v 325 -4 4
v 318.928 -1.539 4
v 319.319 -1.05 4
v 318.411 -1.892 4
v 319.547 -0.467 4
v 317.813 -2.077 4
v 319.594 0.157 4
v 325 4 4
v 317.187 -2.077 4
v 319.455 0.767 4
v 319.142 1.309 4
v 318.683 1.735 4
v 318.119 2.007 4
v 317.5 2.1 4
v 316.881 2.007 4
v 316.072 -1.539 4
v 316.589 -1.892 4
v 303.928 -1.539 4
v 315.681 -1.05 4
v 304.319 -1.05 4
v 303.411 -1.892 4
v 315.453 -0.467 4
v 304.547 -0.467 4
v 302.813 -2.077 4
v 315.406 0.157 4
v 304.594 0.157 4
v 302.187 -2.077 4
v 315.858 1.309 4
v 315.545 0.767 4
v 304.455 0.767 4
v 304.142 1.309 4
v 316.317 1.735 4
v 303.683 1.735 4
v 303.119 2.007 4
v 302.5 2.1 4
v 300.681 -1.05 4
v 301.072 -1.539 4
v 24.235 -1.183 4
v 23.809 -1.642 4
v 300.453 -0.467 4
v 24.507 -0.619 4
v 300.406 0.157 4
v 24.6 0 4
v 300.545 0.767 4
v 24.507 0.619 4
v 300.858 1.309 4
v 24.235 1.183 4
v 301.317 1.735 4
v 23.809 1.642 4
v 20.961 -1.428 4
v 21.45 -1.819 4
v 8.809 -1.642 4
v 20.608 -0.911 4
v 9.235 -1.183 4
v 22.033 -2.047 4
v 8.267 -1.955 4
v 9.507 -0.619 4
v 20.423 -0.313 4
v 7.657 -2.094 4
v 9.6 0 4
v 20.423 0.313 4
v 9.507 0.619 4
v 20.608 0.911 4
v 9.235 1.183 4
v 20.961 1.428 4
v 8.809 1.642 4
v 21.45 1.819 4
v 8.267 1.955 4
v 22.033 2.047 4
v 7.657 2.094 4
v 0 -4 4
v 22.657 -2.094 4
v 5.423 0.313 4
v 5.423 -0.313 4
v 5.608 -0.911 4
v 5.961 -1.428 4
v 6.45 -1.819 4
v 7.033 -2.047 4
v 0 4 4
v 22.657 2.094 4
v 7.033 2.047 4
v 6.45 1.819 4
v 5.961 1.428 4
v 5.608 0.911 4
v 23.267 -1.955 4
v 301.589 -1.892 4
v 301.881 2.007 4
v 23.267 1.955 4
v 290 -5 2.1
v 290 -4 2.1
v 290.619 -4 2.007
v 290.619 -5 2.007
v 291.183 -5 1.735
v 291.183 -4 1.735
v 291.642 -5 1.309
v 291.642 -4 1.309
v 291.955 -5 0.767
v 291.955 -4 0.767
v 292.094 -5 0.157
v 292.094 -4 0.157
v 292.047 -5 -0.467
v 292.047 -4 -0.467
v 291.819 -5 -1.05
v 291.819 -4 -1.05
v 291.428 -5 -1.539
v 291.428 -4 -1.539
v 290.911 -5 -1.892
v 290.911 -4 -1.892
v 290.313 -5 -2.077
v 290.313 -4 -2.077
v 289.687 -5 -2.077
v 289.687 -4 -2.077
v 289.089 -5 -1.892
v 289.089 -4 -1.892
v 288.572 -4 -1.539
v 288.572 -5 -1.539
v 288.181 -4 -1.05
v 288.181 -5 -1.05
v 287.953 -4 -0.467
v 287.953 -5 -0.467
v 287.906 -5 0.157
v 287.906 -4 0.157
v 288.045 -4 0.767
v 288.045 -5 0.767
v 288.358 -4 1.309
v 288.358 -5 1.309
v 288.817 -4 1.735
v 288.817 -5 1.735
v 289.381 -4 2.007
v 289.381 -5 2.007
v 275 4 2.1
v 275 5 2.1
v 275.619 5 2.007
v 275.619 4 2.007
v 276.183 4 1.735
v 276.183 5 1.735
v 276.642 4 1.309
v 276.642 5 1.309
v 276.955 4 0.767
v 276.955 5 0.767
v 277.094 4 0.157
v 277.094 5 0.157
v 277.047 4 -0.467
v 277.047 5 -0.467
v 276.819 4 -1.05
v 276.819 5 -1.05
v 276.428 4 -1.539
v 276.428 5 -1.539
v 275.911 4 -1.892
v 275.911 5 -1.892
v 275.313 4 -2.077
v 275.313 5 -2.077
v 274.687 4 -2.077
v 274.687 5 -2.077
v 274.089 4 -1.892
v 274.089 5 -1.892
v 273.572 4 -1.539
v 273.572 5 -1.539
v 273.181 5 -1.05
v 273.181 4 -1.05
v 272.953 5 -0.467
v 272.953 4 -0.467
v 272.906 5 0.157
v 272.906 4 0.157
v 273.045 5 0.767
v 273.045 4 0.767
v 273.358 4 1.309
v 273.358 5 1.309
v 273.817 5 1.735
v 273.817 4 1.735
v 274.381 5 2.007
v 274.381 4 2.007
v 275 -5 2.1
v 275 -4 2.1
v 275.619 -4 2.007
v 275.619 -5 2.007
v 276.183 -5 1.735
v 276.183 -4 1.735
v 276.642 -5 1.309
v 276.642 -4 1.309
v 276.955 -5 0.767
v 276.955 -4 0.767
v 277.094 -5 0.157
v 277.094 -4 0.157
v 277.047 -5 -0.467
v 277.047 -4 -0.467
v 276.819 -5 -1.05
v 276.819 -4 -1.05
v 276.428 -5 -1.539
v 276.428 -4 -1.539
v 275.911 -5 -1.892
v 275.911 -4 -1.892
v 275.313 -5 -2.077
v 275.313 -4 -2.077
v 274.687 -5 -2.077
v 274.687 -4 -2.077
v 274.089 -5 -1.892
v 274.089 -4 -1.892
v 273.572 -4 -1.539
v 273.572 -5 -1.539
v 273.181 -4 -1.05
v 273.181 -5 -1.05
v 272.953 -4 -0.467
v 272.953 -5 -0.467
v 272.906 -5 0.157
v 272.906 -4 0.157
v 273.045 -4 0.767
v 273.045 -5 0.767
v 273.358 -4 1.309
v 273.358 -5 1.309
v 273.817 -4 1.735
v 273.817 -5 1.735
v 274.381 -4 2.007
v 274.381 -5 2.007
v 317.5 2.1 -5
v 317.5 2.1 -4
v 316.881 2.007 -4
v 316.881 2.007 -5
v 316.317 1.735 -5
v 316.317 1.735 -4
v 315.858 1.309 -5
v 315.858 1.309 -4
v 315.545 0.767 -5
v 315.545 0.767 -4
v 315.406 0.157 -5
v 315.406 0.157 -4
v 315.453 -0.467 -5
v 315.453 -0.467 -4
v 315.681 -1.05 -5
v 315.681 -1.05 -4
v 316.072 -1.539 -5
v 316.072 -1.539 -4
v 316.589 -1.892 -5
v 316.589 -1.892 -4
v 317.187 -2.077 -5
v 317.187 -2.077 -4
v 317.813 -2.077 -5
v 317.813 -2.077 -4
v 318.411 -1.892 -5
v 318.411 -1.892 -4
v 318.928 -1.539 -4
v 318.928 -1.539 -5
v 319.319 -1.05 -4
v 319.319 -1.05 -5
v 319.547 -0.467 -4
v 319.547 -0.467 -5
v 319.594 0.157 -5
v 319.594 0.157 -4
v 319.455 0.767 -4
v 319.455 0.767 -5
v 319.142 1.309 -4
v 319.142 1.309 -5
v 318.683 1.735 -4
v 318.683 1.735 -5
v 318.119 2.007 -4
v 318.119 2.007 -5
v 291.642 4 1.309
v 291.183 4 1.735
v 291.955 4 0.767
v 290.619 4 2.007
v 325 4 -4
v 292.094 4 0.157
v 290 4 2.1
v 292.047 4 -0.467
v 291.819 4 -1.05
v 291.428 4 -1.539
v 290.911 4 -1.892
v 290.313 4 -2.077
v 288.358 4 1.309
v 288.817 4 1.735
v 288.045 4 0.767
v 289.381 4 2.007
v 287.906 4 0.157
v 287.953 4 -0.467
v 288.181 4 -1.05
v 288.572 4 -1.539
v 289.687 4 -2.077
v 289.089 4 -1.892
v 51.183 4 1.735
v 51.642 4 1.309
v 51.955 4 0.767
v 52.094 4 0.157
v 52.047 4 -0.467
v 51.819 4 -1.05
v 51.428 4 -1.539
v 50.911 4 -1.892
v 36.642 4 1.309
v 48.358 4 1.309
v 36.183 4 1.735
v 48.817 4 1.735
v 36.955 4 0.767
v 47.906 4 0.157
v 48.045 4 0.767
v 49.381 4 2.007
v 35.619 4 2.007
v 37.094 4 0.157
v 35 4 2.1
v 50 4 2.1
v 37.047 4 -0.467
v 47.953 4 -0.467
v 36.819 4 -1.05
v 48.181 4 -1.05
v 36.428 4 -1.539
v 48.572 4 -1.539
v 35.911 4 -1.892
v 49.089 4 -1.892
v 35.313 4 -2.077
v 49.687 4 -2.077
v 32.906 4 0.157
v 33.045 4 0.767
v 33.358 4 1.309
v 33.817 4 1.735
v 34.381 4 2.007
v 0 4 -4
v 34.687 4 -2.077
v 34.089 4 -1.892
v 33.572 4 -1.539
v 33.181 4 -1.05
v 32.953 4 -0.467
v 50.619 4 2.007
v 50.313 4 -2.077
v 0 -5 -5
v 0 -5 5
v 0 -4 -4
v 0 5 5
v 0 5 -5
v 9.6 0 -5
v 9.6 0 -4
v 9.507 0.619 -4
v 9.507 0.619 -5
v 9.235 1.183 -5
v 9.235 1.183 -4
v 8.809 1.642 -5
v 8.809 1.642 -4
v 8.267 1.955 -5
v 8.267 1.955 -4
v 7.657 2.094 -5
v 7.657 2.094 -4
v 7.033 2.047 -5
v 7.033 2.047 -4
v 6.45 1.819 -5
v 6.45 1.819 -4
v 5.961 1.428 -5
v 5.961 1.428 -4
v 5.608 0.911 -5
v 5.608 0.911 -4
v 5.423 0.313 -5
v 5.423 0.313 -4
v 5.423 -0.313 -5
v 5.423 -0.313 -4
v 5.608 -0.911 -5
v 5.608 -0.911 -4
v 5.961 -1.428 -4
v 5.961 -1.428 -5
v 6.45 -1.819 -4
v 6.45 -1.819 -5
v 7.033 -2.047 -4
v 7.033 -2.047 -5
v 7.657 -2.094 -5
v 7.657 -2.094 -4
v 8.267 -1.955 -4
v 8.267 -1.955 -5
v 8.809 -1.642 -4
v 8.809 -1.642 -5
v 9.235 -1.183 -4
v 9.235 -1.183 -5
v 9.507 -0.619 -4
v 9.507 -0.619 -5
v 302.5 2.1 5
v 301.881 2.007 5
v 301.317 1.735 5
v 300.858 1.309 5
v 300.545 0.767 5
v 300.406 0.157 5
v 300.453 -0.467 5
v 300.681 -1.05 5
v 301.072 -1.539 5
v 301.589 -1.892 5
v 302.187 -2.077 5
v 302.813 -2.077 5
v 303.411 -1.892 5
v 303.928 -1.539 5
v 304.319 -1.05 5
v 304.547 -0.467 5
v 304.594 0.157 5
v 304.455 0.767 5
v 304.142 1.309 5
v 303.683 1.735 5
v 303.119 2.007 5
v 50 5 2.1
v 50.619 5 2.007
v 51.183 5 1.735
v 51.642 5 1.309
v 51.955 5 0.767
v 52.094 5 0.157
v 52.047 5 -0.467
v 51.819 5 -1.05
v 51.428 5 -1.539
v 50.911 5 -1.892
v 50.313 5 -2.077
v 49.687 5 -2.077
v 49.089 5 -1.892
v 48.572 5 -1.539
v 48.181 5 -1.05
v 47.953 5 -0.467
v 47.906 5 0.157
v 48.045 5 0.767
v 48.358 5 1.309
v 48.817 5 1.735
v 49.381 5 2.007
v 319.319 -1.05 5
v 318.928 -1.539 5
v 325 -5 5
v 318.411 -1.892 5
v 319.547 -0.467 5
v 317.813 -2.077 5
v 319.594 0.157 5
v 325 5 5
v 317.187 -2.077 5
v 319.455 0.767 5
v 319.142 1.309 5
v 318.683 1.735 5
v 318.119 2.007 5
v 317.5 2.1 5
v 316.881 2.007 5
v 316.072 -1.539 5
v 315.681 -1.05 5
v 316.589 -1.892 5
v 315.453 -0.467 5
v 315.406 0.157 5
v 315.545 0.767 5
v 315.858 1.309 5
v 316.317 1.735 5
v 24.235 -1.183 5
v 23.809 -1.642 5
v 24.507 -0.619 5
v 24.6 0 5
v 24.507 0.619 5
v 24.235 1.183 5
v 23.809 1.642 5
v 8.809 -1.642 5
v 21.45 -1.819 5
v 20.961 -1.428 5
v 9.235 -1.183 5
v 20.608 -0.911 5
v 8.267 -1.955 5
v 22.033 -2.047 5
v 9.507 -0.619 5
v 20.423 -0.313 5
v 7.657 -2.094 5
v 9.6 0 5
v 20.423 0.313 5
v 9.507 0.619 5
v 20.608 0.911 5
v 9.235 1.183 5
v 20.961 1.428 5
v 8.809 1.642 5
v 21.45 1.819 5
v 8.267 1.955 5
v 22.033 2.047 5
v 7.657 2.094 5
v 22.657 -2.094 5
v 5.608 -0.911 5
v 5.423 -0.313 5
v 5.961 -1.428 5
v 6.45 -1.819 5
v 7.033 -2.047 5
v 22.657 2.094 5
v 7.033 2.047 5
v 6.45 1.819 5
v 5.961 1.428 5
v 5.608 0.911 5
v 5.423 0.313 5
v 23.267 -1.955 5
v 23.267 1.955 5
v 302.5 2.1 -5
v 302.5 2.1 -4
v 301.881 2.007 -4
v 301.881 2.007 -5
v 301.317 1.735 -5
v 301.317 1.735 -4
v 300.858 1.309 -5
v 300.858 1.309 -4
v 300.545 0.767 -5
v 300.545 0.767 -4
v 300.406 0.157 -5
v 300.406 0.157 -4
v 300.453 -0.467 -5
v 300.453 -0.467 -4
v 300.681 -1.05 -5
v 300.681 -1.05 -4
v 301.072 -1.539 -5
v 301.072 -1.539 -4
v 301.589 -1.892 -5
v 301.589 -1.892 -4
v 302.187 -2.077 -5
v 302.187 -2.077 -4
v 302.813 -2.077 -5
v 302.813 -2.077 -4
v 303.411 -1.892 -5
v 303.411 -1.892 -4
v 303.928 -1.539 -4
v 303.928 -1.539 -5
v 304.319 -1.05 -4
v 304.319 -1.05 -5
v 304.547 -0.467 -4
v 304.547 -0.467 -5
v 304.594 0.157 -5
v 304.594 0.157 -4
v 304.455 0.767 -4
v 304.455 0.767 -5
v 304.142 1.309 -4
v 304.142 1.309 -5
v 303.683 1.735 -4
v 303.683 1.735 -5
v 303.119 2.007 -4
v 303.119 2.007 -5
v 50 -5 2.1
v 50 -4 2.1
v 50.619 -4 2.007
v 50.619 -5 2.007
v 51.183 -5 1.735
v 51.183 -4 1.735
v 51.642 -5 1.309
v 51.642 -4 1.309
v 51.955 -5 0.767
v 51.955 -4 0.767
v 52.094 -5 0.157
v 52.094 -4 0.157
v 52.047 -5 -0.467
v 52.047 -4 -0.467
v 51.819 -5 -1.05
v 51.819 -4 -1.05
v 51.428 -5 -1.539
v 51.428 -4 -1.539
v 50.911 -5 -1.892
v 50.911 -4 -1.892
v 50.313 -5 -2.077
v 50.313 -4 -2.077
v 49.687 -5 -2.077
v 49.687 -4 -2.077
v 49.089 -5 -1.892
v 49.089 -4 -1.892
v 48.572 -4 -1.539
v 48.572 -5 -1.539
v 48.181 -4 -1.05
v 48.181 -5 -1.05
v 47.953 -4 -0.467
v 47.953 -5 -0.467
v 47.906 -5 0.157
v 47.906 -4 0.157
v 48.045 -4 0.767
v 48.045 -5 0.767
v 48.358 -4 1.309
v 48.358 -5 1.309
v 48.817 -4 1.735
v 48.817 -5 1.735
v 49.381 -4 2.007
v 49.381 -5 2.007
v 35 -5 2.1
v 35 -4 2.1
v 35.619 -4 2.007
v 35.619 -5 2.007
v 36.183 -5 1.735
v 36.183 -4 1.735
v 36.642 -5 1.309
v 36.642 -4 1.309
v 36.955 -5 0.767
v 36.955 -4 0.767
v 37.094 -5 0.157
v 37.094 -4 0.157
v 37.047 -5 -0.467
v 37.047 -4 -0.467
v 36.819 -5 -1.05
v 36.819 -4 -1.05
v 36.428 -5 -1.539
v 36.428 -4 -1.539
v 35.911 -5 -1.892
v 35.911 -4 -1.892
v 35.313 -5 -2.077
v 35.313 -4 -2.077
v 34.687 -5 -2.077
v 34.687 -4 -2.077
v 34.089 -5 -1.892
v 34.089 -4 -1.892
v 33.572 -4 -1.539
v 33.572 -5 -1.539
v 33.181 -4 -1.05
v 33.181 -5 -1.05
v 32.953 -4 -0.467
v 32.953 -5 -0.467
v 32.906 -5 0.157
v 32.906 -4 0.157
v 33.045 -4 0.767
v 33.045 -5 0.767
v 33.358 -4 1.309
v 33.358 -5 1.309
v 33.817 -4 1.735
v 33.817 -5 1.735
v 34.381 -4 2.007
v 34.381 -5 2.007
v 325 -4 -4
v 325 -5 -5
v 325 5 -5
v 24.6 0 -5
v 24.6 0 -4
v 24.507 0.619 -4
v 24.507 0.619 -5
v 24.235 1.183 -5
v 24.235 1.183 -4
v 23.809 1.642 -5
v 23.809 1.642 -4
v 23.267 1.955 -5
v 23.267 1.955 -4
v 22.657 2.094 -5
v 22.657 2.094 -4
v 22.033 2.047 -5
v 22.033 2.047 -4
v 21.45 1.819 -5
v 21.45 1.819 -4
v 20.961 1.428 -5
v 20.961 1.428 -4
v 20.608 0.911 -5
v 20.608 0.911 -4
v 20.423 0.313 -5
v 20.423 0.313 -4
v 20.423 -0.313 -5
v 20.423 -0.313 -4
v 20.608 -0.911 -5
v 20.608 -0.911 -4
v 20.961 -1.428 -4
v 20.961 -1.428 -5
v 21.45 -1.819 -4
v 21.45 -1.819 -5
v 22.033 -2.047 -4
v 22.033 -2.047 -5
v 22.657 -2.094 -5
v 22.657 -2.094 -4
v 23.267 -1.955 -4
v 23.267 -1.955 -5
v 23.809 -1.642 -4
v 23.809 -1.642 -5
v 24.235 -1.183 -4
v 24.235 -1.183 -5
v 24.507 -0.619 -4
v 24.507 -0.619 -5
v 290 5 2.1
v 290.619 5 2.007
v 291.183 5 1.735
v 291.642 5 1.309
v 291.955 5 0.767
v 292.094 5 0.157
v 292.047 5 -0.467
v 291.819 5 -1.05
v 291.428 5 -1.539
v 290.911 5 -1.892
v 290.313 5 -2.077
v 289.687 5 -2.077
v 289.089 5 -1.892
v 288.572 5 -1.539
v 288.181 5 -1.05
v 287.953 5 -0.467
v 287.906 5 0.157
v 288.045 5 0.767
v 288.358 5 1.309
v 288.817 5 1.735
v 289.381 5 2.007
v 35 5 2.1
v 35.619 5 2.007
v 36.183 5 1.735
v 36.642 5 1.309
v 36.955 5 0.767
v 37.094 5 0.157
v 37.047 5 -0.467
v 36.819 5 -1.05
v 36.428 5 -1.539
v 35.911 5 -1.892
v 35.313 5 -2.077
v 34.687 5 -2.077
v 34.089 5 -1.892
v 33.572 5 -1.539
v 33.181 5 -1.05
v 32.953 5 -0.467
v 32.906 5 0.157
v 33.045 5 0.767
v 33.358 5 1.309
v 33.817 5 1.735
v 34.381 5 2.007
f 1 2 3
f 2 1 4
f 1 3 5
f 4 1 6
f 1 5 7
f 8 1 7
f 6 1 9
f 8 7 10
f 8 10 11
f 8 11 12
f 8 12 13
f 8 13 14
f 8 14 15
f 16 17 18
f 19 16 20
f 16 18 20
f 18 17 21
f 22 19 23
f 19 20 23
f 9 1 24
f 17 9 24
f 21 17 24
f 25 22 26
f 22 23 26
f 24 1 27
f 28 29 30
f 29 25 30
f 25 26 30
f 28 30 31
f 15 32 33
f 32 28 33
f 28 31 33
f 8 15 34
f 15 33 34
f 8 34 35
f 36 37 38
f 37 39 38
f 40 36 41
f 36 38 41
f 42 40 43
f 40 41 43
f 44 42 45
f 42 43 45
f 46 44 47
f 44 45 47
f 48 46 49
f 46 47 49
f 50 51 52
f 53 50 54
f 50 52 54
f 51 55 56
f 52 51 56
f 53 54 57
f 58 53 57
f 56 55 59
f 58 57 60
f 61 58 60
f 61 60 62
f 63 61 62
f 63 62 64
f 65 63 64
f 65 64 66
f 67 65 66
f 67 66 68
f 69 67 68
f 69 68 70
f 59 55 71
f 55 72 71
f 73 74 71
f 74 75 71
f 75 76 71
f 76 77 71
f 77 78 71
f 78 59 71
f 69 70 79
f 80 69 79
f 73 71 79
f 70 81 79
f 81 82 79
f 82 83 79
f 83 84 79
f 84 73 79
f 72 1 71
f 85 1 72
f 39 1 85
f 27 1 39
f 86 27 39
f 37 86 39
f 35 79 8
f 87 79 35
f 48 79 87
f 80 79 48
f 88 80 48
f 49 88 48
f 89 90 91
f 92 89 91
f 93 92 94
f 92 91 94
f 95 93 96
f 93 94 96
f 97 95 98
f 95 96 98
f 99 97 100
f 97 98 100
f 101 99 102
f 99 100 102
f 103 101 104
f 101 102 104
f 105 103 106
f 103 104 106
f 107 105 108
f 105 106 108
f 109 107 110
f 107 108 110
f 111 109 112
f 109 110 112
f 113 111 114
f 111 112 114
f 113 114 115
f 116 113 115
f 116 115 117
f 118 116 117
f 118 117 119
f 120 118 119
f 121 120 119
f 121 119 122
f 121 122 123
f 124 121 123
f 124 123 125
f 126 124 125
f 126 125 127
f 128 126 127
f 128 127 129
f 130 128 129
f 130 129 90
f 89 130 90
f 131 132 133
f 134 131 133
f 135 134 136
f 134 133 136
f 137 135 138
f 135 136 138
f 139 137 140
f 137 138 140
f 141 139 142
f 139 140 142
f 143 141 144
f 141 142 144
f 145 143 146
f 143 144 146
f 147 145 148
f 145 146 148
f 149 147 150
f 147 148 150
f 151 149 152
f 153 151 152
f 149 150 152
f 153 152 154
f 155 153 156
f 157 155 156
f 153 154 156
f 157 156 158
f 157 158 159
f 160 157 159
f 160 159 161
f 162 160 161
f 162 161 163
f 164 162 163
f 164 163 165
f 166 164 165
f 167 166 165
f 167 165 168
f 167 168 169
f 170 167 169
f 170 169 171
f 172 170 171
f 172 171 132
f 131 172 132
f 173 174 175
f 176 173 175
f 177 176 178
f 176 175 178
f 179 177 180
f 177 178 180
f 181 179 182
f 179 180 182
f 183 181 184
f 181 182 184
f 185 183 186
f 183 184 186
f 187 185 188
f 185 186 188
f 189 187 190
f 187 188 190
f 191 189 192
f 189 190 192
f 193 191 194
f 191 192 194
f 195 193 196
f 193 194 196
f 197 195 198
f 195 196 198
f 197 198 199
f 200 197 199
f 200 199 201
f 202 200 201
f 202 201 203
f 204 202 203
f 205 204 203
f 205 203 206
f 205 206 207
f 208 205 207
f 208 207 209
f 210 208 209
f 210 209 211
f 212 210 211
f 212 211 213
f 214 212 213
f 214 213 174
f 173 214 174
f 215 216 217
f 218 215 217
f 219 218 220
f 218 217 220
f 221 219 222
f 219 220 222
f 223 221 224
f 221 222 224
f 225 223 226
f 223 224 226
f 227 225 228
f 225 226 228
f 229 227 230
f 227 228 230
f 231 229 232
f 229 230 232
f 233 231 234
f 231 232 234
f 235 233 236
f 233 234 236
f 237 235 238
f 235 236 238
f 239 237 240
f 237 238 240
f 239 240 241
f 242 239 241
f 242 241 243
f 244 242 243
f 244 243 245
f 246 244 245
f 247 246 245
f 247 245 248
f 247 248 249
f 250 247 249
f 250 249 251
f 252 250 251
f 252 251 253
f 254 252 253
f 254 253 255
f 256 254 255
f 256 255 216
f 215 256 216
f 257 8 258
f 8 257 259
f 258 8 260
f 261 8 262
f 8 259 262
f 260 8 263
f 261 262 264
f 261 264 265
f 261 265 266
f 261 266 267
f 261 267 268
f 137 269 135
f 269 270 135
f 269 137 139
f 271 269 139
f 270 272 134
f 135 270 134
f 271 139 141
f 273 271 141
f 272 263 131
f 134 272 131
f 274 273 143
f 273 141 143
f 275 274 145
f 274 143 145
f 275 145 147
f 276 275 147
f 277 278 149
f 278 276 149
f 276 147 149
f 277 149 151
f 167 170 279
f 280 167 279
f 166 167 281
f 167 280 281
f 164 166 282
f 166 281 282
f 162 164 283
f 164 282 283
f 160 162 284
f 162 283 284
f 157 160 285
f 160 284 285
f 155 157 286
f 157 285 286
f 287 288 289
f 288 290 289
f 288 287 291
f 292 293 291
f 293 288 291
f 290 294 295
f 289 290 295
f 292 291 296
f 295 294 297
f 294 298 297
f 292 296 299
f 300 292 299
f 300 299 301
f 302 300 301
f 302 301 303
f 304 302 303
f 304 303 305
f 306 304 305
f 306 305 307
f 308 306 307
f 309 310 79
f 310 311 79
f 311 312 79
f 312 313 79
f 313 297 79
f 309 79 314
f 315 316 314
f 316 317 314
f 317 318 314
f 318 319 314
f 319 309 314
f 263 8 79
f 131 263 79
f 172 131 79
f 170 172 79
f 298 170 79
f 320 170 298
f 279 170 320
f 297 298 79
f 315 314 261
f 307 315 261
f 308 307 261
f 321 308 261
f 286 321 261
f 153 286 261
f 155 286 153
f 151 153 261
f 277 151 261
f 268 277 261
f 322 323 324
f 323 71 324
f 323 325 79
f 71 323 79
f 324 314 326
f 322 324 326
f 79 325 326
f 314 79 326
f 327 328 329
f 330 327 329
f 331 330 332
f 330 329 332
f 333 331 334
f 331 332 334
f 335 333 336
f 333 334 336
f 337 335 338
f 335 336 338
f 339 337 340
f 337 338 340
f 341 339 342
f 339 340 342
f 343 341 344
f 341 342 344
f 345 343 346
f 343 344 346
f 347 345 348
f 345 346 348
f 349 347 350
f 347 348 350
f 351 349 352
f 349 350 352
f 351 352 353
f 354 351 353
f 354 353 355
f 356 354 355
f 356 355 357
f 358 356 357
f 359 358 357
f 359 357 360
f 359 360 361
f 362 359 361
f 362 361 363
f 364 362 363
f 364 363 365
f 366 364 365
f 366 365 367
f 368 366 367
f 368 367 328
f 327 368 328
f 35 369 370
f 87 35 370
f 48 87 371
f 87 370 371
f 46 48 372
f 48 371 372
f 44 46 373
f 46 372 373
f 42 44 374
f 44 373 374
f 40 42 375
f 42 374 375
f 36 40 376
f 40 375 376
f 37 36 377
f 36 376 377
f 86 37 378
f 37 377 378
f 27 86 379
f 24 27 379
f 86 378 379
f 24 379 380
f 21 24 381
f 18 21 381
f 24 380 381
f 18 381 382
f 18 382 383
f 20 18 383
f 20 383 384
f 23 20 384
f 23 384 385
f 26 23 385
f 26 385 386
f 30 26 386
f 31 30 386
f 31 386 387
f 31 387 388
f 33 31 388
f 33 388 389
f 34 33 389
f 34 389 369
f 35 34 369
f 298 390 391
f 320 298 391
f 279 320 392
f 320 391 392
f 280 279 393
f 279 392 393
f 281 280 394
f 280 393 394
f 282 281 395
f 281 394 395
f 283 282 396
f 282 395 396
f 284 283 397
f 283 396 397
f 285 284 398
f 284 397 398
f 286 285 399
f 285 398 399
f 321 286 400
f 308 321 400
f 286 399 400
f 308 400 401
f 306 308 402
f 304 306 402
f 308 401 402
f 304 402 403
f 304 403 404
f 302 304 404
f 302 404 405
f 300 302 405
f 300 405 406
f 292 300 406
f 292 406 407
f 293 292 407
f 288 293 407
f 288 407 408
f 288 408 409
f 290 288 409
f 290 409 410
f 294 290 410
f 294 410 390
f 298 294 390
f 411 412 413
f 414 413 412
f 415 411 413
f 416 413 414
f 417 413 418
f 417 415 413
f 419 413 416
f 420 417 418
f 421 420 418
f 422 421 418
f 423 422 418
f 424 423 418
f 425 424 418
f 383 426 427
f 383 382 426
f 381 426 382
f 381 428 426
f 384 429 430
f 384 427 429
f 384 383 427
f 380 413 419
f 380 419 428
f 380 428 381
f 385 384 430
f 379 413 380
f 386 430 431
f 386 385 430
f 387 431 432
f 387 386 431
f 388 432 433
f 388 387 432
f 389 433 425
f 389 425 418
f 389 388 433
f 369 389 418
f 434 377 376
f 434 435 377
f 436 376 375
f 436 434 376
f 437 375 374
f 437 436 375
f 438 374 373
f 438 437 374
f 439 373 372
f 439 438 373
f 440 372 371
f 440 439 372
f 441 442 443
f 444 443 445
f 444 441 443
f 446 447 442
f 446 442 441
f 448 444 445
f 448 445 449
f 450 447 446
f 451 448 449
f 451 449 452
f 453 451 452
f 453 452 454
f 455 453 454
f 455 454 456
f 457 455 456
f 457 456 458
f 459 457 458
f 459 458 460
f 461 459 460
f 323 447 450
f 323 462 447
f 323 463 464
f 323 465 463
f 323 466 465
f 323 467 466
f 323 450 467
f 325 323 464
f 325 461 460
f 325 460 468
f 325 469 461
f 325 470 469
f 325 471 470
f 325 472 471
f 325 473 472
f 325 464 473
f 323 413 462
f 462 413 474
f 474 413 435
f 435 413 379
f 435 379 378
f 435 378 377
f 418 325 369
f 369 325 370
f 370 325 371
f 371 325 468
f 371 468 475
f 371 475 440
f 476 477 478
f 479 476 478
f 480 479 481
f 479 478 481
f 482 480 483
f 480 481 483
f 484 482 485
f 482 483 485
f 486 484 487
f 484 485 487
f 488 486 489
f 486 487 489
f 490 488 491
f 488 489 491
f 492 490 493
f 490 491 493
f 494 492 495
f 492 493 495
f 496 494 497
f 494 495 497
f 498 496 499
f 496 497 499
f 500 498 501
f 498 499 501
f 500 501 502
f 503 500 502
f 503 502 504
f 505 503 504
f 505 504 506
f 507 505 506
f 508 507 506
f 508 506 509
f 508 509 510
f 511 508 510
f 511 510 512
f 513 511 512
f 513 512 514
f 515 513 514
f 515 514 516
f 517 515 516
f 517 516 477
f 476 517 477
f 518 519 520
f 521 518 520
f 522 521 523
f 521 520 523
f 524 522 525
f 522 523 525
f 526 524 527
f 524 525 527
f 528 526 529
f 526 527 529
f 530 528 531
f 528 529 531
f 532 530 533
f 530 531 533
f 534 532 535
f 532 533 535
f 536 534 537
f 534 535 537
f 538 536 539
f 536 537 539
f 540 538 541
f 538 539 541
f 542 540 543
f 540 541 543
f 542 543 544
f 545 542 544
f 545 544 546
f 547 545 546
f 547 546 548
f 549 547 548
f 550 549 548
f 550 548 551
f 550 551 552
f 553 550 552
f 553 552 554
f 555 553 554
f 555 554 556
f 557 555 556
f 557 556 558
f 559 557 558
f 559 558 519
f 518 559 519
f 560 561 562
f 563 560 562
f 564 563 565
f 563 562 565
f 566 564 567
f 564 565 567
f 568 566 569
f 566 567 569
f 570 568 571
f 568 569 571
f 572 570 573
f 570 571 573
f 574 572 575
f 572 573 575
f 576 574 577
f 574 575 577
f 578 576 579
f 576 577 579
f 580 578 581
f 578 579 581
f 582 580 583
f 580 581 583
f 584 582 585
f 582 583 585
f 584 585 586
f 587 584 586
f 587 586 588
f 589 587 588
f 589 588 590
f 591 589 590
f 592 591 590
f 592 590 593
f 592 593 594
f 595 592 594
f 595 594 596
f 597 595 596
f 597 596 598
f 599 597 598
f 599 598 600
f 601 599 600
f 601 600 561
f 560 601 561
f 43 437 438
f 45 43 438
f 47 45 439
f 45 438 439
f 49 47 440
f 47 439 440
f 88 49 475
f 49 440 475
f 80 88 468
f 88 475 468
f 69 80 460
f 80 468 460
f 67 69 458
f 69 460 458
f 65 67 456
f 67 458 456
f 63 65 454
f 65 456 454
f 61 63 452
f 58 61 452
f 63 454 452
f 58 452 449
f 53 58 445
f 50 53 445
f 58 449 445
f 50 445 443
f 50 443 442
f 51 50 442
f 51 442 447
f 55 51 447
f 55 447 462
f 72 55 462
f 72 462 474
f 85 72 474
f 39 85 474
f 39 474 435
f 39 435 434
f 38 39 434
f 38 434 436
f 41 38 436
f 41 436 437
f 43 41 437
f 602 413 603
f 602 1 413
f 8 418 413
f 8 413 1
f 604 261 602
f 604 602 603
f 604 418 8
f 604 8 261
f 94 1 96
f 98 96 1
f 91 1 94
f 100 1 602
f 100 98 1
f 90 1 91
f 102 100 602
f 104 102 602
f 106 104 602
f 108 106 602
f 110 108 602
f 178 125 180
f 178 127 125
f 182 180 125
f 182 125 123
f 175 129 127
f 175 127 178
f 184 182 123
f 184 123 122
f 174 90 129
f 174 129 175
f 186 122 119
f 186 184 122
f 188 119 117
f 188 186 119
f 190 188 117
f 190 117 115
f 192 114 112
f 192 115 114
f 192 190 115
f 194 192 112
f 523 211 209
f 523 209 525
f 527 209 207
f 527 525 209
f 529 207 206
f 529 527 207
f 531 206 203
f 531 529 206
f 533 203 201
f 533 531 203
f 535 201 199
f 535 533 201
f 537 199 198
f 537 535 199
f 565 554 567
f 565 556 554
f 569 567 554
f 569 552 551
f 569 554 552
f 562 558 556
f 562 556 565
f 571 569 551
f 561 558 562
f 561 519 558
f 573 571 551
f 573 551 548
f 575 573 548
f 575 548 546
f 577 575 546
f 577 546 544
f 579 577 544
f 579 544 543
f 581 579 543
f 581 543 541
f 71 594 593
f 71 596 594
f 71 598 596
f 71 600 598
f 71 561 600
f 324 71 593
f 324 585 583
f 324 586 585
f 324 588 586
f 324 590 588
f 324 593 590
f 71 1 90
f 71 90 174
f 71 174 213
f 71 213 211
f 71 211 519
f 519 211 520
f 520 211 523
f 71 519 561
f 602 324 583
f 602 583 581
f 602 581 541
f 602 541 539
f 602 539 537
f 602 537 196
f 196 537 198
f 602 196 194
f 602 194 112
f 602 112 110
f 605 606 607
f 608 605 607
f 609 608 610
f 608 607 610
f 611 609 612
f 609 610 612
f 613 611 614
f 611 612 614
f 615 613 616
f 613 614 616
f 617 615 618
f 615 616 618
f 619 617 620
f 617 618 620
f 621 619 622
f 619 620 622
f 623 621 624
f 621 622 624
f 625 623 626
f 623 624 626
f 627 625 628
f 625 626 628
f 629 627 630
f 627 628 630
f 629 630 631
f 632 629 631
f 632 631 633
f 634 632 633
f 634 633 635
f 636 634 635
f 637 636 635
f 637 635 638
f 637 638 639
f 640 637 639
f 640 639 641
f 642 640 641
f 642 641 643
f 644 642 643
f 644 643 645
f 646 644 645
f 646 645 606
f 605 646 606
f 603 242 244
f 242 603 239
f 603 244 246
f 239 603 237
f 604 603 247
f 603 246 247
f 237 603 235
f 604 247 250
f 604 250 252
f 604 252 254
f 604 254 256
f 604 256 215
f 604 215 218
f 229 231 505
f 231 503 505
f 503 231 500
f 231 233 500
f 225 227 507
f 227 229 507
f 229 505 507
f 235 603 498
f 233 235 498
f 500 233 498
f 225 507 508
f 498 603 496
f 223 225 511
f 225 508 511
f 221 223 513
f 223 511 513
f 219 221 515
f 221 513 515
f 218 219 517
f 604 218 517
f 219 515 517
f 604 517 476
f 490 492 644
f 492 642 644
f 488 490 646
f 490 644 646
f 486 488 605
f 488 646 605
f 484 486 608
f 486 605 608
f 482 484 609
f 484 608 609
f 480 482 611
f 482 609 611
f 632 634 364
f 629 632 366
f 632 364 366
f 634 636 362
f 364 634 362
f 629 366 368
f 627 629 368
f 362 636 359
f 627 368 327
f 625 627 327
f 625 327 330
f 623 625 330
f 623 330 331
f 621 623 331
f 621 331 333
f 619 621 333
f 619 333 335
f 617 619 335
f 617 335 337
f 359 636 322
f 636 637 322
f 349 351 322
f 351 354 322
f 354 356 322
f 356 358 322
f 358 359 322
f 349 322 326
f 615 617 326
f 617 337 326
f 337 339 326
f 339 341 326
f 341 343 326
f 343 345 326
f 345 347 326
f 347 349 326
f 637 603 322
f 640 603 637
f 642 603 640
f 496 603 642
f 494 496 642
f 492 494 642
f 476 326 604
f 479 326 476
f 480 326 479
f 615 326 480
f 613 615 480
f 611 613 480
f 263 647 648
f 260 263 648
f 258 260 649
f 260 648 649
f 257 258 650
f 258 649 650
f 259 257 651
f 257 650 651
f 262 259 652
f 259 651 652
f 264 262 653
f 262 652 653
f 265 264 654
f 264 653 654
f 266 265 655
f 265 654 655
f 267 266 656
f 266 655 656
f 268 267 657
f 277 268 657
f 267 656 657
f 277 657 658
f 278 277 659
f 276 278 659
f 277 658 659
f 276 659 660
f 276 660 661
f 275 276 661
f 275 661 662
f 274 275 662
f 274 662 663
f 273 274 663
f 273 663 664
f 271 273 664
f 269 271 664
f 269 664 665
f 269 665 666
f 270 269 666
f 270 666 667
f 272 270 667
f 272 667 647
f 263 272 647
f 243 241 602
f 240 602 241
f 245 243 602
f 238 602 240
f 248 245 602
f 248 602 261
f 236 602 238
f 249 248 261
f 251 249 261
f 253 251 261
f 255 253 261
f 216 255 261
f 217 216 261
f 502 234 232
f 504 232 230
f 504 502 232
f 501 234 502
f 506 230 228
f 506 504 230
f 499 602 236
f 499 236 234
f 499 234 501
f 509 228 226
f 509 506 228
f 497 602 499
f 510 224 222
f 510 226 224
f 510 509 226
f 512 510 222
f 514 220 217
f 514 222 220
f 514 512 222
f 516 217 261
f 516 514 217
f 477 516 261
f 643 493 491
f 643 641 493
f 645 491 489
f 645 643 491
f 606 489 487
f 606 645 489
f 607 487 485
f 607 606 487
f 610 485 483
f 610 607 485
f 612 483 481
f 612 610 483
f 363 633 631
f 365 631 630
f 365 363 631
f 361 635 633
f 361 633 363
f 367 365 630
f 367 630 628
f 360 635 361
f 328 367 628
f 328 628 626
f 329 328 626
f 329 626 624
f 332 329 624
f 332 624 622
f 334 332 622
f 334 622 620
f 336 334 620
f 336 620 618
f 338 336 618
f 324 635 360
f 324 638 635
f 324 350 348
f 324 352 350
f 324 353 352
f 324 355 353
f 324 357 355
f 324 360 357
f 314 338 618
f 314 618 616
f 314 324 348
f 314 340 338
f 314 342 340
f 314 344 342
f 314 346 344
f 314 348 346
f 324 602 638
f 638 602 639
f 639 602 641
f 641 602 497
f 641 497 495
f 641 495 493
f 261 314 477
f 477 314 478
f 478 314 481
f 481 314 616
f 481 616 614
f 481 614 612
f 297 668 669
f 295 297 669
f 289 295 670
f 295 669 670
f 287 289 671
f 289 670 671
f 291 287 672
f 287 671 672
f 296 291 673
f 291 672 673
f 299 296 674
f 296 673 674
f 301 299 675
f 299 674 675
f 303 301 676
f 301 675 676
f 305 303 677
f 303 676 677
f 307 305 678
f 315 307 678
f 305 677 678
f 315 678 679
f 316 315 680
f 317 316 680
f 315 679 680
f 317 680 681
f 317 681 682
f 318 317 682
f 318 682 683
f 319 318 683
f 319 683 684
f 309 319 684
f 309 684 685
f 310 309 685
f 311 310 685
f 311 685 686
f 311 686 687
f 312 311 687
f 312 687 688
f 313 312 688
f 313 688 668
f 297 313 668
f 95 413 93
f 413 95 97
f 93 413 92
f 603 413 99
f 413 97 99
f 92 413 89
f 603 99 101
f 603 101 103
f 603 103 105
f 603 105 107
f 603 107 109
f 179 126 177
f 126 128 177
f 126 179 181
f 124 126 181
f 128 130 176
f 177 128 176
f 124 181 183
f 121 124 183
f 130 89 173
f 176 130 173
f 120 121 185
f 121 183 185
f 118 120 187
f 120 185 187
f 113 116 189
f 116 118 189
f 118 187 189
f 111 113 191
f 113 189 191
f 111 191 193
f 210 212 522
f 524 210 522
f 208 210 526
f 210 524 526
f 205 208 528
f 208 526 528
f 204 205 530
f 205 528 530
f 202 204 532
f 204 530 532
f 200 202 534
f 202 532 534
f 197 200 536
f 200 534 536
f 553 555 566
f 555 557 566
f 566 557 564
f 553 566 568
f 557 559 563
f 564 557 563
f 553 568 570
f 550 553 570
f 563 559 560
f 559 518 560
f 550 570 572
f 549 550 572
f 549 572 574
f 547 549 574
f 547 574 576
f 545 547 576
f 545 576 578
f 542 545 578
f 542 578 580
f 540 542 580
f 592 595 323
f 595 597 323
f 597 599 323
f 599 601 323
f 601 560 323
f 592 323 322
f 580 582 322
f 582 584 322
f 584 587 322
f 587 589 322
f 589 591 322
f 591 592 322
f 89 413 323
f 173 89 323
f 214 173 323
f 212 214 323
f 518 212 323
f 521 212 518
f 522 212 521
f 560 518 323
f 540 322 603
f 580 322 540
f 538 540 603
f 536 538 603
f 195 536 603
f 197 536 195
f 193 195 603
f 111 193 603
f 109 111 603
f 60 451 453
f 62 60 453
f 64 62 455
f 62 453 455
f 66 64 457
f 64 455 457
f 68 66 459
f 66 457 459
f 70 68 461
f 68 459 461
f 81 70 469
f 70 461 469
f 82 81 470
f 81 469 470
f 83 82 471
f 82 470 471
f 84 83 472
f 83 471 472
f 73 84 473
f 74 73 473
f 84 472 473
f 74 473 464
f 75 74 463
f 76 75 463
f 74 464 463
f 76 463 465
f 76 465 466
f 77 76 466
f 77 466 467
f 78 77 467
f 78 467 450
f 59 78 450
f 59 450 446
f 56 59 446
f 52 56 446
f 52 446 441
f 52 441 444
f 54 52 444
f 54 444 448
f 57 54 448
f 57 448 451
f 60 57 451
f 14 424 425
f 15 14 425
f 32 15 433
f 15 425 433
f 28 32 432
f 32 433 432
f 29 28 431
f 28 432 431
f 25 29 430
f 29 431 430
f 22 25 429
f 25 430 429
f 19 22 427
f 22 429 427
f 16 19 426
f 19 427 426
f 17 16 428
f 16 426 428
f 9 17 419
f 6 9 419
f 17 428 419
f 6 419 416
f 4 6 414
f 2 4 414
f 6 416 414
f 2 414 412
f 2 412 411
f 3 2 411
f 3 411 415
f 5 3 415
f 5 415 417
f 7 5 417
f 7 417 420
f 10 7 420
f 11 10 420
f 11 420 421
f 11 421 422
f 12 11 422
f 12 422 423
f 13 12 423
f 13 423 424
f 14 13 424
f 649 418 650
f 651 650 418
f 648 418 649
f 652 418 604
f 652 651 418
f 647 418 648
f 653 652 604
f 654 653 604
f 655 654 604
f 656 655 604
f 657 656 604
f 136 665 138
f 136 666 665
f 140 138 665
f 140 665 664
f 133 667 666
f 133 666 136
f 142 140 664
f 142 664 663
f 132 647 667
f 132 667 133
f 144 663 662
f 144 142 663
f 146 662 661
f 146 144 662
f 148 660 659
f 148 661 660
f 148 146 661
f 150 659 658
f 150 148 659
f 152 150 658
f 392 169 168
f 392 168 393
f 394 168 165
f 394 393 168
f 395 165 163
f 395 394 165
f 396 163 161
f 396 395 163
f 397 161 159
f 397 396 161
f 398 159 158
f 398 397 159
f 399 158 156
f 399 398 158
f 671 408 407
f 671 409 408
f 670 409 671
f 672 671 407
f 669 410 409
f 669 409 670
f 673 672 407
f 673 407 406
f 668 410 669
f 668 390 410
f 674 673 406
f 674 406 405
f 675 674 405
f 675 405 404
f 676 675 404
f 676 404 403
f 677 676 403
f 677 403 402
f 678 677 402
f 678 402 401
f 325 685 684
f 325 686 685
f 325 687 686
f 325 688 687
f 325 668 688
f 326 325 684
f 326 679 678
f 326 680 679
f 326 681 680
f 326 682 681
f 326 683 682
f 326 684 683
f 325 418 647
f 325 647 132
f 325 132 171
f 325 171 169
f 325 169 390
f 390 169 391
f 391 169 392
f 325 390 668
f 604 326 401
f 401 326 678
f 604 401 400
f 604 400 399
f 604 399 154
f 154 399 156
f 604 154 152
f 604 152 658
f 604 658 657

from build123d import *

# Parameters (mm, degrees)
SKETCH_1_W          = 10
SKETCH_1_H          = 10
SKETCH_1_W_2        = 8
SKETCH_1_H_2        = 8
EXTRUDE_1_DEPTH     = 325
SKETCH_2_R          = 2.1
CUT_EXTRUDE_1_DEPTH = 326.19225083
SKETCH_3_R          = 2.1
CUT_EXTRUDE_2_DEPTH = 326.19225083


with BuildPart() as part:
    # ｽｹｯﾁ1 → 押し出し-薄板1 (new body)
    with BuildSketch(Plane(origin=(0, 0, 0), x_dir=(0, 0, -1), z_dir=(1, 0, 0))):
        Rectangle(SKETCH_1_W, SKETCH_1_H)
        Rectangle(SKETCH_1_W_2, SKETCH_1_H_2, mode=Mode.SUBTRACT)
    extrude(amount=EXTRUDE_1_DEPTH)

    # ｽｹｯﾁ2 → ｶｯﾄ - 押し出し1 (cut, through all)
    with BuildSketch(Plane.XY.offset(5)):
        with Locations((22.5, 0)):
            Circle(SKETCH_2_R)
        with Locations((7.5, 0)):
            Circle(SKETCH_2_R)
        with Locations(Location((317.5, 0, 0), (0, 0, 90))):
            Circle(SKETCH_2_R)
        with Locations(Location((302.5, 0, 0), (0, 0, 90))):
            Circle(SKETCH_2_R)
    extrude(amount=-CUT_EXTRUDE_1_DEPTH, mode=Mode.SUBTRACT)

    # ｽｹｯﾁ3 → ｶｯﾄ - 押し出し2 (cut, through all)
    with BuildSketch(Plane(origin=(0, 5, 0), x_dir=(1, 0, 0), z_dir=(0, 1, 0))):
        with Locations(Location((275, 0, 0), (0, 0, 270))):
            Circle(SKETCH_3_R)
        with Locations(Location((290, 0, 0), (0, 0, 270))):
            Circle(SKETCH_3_R)
        with Locations(Location((35, 0, 0), (0, 0, 270))):
            Circle(SKETCH_3_R)
        with Locations(Location((50, 0, 0), (0, 0, 270))):
            Circle(SKETCH_3_R)
    extrude(amount=-CUT_EXTRUDE_2_DEPTH, mode=Mode.SUBTRACT)


solid = part.part
